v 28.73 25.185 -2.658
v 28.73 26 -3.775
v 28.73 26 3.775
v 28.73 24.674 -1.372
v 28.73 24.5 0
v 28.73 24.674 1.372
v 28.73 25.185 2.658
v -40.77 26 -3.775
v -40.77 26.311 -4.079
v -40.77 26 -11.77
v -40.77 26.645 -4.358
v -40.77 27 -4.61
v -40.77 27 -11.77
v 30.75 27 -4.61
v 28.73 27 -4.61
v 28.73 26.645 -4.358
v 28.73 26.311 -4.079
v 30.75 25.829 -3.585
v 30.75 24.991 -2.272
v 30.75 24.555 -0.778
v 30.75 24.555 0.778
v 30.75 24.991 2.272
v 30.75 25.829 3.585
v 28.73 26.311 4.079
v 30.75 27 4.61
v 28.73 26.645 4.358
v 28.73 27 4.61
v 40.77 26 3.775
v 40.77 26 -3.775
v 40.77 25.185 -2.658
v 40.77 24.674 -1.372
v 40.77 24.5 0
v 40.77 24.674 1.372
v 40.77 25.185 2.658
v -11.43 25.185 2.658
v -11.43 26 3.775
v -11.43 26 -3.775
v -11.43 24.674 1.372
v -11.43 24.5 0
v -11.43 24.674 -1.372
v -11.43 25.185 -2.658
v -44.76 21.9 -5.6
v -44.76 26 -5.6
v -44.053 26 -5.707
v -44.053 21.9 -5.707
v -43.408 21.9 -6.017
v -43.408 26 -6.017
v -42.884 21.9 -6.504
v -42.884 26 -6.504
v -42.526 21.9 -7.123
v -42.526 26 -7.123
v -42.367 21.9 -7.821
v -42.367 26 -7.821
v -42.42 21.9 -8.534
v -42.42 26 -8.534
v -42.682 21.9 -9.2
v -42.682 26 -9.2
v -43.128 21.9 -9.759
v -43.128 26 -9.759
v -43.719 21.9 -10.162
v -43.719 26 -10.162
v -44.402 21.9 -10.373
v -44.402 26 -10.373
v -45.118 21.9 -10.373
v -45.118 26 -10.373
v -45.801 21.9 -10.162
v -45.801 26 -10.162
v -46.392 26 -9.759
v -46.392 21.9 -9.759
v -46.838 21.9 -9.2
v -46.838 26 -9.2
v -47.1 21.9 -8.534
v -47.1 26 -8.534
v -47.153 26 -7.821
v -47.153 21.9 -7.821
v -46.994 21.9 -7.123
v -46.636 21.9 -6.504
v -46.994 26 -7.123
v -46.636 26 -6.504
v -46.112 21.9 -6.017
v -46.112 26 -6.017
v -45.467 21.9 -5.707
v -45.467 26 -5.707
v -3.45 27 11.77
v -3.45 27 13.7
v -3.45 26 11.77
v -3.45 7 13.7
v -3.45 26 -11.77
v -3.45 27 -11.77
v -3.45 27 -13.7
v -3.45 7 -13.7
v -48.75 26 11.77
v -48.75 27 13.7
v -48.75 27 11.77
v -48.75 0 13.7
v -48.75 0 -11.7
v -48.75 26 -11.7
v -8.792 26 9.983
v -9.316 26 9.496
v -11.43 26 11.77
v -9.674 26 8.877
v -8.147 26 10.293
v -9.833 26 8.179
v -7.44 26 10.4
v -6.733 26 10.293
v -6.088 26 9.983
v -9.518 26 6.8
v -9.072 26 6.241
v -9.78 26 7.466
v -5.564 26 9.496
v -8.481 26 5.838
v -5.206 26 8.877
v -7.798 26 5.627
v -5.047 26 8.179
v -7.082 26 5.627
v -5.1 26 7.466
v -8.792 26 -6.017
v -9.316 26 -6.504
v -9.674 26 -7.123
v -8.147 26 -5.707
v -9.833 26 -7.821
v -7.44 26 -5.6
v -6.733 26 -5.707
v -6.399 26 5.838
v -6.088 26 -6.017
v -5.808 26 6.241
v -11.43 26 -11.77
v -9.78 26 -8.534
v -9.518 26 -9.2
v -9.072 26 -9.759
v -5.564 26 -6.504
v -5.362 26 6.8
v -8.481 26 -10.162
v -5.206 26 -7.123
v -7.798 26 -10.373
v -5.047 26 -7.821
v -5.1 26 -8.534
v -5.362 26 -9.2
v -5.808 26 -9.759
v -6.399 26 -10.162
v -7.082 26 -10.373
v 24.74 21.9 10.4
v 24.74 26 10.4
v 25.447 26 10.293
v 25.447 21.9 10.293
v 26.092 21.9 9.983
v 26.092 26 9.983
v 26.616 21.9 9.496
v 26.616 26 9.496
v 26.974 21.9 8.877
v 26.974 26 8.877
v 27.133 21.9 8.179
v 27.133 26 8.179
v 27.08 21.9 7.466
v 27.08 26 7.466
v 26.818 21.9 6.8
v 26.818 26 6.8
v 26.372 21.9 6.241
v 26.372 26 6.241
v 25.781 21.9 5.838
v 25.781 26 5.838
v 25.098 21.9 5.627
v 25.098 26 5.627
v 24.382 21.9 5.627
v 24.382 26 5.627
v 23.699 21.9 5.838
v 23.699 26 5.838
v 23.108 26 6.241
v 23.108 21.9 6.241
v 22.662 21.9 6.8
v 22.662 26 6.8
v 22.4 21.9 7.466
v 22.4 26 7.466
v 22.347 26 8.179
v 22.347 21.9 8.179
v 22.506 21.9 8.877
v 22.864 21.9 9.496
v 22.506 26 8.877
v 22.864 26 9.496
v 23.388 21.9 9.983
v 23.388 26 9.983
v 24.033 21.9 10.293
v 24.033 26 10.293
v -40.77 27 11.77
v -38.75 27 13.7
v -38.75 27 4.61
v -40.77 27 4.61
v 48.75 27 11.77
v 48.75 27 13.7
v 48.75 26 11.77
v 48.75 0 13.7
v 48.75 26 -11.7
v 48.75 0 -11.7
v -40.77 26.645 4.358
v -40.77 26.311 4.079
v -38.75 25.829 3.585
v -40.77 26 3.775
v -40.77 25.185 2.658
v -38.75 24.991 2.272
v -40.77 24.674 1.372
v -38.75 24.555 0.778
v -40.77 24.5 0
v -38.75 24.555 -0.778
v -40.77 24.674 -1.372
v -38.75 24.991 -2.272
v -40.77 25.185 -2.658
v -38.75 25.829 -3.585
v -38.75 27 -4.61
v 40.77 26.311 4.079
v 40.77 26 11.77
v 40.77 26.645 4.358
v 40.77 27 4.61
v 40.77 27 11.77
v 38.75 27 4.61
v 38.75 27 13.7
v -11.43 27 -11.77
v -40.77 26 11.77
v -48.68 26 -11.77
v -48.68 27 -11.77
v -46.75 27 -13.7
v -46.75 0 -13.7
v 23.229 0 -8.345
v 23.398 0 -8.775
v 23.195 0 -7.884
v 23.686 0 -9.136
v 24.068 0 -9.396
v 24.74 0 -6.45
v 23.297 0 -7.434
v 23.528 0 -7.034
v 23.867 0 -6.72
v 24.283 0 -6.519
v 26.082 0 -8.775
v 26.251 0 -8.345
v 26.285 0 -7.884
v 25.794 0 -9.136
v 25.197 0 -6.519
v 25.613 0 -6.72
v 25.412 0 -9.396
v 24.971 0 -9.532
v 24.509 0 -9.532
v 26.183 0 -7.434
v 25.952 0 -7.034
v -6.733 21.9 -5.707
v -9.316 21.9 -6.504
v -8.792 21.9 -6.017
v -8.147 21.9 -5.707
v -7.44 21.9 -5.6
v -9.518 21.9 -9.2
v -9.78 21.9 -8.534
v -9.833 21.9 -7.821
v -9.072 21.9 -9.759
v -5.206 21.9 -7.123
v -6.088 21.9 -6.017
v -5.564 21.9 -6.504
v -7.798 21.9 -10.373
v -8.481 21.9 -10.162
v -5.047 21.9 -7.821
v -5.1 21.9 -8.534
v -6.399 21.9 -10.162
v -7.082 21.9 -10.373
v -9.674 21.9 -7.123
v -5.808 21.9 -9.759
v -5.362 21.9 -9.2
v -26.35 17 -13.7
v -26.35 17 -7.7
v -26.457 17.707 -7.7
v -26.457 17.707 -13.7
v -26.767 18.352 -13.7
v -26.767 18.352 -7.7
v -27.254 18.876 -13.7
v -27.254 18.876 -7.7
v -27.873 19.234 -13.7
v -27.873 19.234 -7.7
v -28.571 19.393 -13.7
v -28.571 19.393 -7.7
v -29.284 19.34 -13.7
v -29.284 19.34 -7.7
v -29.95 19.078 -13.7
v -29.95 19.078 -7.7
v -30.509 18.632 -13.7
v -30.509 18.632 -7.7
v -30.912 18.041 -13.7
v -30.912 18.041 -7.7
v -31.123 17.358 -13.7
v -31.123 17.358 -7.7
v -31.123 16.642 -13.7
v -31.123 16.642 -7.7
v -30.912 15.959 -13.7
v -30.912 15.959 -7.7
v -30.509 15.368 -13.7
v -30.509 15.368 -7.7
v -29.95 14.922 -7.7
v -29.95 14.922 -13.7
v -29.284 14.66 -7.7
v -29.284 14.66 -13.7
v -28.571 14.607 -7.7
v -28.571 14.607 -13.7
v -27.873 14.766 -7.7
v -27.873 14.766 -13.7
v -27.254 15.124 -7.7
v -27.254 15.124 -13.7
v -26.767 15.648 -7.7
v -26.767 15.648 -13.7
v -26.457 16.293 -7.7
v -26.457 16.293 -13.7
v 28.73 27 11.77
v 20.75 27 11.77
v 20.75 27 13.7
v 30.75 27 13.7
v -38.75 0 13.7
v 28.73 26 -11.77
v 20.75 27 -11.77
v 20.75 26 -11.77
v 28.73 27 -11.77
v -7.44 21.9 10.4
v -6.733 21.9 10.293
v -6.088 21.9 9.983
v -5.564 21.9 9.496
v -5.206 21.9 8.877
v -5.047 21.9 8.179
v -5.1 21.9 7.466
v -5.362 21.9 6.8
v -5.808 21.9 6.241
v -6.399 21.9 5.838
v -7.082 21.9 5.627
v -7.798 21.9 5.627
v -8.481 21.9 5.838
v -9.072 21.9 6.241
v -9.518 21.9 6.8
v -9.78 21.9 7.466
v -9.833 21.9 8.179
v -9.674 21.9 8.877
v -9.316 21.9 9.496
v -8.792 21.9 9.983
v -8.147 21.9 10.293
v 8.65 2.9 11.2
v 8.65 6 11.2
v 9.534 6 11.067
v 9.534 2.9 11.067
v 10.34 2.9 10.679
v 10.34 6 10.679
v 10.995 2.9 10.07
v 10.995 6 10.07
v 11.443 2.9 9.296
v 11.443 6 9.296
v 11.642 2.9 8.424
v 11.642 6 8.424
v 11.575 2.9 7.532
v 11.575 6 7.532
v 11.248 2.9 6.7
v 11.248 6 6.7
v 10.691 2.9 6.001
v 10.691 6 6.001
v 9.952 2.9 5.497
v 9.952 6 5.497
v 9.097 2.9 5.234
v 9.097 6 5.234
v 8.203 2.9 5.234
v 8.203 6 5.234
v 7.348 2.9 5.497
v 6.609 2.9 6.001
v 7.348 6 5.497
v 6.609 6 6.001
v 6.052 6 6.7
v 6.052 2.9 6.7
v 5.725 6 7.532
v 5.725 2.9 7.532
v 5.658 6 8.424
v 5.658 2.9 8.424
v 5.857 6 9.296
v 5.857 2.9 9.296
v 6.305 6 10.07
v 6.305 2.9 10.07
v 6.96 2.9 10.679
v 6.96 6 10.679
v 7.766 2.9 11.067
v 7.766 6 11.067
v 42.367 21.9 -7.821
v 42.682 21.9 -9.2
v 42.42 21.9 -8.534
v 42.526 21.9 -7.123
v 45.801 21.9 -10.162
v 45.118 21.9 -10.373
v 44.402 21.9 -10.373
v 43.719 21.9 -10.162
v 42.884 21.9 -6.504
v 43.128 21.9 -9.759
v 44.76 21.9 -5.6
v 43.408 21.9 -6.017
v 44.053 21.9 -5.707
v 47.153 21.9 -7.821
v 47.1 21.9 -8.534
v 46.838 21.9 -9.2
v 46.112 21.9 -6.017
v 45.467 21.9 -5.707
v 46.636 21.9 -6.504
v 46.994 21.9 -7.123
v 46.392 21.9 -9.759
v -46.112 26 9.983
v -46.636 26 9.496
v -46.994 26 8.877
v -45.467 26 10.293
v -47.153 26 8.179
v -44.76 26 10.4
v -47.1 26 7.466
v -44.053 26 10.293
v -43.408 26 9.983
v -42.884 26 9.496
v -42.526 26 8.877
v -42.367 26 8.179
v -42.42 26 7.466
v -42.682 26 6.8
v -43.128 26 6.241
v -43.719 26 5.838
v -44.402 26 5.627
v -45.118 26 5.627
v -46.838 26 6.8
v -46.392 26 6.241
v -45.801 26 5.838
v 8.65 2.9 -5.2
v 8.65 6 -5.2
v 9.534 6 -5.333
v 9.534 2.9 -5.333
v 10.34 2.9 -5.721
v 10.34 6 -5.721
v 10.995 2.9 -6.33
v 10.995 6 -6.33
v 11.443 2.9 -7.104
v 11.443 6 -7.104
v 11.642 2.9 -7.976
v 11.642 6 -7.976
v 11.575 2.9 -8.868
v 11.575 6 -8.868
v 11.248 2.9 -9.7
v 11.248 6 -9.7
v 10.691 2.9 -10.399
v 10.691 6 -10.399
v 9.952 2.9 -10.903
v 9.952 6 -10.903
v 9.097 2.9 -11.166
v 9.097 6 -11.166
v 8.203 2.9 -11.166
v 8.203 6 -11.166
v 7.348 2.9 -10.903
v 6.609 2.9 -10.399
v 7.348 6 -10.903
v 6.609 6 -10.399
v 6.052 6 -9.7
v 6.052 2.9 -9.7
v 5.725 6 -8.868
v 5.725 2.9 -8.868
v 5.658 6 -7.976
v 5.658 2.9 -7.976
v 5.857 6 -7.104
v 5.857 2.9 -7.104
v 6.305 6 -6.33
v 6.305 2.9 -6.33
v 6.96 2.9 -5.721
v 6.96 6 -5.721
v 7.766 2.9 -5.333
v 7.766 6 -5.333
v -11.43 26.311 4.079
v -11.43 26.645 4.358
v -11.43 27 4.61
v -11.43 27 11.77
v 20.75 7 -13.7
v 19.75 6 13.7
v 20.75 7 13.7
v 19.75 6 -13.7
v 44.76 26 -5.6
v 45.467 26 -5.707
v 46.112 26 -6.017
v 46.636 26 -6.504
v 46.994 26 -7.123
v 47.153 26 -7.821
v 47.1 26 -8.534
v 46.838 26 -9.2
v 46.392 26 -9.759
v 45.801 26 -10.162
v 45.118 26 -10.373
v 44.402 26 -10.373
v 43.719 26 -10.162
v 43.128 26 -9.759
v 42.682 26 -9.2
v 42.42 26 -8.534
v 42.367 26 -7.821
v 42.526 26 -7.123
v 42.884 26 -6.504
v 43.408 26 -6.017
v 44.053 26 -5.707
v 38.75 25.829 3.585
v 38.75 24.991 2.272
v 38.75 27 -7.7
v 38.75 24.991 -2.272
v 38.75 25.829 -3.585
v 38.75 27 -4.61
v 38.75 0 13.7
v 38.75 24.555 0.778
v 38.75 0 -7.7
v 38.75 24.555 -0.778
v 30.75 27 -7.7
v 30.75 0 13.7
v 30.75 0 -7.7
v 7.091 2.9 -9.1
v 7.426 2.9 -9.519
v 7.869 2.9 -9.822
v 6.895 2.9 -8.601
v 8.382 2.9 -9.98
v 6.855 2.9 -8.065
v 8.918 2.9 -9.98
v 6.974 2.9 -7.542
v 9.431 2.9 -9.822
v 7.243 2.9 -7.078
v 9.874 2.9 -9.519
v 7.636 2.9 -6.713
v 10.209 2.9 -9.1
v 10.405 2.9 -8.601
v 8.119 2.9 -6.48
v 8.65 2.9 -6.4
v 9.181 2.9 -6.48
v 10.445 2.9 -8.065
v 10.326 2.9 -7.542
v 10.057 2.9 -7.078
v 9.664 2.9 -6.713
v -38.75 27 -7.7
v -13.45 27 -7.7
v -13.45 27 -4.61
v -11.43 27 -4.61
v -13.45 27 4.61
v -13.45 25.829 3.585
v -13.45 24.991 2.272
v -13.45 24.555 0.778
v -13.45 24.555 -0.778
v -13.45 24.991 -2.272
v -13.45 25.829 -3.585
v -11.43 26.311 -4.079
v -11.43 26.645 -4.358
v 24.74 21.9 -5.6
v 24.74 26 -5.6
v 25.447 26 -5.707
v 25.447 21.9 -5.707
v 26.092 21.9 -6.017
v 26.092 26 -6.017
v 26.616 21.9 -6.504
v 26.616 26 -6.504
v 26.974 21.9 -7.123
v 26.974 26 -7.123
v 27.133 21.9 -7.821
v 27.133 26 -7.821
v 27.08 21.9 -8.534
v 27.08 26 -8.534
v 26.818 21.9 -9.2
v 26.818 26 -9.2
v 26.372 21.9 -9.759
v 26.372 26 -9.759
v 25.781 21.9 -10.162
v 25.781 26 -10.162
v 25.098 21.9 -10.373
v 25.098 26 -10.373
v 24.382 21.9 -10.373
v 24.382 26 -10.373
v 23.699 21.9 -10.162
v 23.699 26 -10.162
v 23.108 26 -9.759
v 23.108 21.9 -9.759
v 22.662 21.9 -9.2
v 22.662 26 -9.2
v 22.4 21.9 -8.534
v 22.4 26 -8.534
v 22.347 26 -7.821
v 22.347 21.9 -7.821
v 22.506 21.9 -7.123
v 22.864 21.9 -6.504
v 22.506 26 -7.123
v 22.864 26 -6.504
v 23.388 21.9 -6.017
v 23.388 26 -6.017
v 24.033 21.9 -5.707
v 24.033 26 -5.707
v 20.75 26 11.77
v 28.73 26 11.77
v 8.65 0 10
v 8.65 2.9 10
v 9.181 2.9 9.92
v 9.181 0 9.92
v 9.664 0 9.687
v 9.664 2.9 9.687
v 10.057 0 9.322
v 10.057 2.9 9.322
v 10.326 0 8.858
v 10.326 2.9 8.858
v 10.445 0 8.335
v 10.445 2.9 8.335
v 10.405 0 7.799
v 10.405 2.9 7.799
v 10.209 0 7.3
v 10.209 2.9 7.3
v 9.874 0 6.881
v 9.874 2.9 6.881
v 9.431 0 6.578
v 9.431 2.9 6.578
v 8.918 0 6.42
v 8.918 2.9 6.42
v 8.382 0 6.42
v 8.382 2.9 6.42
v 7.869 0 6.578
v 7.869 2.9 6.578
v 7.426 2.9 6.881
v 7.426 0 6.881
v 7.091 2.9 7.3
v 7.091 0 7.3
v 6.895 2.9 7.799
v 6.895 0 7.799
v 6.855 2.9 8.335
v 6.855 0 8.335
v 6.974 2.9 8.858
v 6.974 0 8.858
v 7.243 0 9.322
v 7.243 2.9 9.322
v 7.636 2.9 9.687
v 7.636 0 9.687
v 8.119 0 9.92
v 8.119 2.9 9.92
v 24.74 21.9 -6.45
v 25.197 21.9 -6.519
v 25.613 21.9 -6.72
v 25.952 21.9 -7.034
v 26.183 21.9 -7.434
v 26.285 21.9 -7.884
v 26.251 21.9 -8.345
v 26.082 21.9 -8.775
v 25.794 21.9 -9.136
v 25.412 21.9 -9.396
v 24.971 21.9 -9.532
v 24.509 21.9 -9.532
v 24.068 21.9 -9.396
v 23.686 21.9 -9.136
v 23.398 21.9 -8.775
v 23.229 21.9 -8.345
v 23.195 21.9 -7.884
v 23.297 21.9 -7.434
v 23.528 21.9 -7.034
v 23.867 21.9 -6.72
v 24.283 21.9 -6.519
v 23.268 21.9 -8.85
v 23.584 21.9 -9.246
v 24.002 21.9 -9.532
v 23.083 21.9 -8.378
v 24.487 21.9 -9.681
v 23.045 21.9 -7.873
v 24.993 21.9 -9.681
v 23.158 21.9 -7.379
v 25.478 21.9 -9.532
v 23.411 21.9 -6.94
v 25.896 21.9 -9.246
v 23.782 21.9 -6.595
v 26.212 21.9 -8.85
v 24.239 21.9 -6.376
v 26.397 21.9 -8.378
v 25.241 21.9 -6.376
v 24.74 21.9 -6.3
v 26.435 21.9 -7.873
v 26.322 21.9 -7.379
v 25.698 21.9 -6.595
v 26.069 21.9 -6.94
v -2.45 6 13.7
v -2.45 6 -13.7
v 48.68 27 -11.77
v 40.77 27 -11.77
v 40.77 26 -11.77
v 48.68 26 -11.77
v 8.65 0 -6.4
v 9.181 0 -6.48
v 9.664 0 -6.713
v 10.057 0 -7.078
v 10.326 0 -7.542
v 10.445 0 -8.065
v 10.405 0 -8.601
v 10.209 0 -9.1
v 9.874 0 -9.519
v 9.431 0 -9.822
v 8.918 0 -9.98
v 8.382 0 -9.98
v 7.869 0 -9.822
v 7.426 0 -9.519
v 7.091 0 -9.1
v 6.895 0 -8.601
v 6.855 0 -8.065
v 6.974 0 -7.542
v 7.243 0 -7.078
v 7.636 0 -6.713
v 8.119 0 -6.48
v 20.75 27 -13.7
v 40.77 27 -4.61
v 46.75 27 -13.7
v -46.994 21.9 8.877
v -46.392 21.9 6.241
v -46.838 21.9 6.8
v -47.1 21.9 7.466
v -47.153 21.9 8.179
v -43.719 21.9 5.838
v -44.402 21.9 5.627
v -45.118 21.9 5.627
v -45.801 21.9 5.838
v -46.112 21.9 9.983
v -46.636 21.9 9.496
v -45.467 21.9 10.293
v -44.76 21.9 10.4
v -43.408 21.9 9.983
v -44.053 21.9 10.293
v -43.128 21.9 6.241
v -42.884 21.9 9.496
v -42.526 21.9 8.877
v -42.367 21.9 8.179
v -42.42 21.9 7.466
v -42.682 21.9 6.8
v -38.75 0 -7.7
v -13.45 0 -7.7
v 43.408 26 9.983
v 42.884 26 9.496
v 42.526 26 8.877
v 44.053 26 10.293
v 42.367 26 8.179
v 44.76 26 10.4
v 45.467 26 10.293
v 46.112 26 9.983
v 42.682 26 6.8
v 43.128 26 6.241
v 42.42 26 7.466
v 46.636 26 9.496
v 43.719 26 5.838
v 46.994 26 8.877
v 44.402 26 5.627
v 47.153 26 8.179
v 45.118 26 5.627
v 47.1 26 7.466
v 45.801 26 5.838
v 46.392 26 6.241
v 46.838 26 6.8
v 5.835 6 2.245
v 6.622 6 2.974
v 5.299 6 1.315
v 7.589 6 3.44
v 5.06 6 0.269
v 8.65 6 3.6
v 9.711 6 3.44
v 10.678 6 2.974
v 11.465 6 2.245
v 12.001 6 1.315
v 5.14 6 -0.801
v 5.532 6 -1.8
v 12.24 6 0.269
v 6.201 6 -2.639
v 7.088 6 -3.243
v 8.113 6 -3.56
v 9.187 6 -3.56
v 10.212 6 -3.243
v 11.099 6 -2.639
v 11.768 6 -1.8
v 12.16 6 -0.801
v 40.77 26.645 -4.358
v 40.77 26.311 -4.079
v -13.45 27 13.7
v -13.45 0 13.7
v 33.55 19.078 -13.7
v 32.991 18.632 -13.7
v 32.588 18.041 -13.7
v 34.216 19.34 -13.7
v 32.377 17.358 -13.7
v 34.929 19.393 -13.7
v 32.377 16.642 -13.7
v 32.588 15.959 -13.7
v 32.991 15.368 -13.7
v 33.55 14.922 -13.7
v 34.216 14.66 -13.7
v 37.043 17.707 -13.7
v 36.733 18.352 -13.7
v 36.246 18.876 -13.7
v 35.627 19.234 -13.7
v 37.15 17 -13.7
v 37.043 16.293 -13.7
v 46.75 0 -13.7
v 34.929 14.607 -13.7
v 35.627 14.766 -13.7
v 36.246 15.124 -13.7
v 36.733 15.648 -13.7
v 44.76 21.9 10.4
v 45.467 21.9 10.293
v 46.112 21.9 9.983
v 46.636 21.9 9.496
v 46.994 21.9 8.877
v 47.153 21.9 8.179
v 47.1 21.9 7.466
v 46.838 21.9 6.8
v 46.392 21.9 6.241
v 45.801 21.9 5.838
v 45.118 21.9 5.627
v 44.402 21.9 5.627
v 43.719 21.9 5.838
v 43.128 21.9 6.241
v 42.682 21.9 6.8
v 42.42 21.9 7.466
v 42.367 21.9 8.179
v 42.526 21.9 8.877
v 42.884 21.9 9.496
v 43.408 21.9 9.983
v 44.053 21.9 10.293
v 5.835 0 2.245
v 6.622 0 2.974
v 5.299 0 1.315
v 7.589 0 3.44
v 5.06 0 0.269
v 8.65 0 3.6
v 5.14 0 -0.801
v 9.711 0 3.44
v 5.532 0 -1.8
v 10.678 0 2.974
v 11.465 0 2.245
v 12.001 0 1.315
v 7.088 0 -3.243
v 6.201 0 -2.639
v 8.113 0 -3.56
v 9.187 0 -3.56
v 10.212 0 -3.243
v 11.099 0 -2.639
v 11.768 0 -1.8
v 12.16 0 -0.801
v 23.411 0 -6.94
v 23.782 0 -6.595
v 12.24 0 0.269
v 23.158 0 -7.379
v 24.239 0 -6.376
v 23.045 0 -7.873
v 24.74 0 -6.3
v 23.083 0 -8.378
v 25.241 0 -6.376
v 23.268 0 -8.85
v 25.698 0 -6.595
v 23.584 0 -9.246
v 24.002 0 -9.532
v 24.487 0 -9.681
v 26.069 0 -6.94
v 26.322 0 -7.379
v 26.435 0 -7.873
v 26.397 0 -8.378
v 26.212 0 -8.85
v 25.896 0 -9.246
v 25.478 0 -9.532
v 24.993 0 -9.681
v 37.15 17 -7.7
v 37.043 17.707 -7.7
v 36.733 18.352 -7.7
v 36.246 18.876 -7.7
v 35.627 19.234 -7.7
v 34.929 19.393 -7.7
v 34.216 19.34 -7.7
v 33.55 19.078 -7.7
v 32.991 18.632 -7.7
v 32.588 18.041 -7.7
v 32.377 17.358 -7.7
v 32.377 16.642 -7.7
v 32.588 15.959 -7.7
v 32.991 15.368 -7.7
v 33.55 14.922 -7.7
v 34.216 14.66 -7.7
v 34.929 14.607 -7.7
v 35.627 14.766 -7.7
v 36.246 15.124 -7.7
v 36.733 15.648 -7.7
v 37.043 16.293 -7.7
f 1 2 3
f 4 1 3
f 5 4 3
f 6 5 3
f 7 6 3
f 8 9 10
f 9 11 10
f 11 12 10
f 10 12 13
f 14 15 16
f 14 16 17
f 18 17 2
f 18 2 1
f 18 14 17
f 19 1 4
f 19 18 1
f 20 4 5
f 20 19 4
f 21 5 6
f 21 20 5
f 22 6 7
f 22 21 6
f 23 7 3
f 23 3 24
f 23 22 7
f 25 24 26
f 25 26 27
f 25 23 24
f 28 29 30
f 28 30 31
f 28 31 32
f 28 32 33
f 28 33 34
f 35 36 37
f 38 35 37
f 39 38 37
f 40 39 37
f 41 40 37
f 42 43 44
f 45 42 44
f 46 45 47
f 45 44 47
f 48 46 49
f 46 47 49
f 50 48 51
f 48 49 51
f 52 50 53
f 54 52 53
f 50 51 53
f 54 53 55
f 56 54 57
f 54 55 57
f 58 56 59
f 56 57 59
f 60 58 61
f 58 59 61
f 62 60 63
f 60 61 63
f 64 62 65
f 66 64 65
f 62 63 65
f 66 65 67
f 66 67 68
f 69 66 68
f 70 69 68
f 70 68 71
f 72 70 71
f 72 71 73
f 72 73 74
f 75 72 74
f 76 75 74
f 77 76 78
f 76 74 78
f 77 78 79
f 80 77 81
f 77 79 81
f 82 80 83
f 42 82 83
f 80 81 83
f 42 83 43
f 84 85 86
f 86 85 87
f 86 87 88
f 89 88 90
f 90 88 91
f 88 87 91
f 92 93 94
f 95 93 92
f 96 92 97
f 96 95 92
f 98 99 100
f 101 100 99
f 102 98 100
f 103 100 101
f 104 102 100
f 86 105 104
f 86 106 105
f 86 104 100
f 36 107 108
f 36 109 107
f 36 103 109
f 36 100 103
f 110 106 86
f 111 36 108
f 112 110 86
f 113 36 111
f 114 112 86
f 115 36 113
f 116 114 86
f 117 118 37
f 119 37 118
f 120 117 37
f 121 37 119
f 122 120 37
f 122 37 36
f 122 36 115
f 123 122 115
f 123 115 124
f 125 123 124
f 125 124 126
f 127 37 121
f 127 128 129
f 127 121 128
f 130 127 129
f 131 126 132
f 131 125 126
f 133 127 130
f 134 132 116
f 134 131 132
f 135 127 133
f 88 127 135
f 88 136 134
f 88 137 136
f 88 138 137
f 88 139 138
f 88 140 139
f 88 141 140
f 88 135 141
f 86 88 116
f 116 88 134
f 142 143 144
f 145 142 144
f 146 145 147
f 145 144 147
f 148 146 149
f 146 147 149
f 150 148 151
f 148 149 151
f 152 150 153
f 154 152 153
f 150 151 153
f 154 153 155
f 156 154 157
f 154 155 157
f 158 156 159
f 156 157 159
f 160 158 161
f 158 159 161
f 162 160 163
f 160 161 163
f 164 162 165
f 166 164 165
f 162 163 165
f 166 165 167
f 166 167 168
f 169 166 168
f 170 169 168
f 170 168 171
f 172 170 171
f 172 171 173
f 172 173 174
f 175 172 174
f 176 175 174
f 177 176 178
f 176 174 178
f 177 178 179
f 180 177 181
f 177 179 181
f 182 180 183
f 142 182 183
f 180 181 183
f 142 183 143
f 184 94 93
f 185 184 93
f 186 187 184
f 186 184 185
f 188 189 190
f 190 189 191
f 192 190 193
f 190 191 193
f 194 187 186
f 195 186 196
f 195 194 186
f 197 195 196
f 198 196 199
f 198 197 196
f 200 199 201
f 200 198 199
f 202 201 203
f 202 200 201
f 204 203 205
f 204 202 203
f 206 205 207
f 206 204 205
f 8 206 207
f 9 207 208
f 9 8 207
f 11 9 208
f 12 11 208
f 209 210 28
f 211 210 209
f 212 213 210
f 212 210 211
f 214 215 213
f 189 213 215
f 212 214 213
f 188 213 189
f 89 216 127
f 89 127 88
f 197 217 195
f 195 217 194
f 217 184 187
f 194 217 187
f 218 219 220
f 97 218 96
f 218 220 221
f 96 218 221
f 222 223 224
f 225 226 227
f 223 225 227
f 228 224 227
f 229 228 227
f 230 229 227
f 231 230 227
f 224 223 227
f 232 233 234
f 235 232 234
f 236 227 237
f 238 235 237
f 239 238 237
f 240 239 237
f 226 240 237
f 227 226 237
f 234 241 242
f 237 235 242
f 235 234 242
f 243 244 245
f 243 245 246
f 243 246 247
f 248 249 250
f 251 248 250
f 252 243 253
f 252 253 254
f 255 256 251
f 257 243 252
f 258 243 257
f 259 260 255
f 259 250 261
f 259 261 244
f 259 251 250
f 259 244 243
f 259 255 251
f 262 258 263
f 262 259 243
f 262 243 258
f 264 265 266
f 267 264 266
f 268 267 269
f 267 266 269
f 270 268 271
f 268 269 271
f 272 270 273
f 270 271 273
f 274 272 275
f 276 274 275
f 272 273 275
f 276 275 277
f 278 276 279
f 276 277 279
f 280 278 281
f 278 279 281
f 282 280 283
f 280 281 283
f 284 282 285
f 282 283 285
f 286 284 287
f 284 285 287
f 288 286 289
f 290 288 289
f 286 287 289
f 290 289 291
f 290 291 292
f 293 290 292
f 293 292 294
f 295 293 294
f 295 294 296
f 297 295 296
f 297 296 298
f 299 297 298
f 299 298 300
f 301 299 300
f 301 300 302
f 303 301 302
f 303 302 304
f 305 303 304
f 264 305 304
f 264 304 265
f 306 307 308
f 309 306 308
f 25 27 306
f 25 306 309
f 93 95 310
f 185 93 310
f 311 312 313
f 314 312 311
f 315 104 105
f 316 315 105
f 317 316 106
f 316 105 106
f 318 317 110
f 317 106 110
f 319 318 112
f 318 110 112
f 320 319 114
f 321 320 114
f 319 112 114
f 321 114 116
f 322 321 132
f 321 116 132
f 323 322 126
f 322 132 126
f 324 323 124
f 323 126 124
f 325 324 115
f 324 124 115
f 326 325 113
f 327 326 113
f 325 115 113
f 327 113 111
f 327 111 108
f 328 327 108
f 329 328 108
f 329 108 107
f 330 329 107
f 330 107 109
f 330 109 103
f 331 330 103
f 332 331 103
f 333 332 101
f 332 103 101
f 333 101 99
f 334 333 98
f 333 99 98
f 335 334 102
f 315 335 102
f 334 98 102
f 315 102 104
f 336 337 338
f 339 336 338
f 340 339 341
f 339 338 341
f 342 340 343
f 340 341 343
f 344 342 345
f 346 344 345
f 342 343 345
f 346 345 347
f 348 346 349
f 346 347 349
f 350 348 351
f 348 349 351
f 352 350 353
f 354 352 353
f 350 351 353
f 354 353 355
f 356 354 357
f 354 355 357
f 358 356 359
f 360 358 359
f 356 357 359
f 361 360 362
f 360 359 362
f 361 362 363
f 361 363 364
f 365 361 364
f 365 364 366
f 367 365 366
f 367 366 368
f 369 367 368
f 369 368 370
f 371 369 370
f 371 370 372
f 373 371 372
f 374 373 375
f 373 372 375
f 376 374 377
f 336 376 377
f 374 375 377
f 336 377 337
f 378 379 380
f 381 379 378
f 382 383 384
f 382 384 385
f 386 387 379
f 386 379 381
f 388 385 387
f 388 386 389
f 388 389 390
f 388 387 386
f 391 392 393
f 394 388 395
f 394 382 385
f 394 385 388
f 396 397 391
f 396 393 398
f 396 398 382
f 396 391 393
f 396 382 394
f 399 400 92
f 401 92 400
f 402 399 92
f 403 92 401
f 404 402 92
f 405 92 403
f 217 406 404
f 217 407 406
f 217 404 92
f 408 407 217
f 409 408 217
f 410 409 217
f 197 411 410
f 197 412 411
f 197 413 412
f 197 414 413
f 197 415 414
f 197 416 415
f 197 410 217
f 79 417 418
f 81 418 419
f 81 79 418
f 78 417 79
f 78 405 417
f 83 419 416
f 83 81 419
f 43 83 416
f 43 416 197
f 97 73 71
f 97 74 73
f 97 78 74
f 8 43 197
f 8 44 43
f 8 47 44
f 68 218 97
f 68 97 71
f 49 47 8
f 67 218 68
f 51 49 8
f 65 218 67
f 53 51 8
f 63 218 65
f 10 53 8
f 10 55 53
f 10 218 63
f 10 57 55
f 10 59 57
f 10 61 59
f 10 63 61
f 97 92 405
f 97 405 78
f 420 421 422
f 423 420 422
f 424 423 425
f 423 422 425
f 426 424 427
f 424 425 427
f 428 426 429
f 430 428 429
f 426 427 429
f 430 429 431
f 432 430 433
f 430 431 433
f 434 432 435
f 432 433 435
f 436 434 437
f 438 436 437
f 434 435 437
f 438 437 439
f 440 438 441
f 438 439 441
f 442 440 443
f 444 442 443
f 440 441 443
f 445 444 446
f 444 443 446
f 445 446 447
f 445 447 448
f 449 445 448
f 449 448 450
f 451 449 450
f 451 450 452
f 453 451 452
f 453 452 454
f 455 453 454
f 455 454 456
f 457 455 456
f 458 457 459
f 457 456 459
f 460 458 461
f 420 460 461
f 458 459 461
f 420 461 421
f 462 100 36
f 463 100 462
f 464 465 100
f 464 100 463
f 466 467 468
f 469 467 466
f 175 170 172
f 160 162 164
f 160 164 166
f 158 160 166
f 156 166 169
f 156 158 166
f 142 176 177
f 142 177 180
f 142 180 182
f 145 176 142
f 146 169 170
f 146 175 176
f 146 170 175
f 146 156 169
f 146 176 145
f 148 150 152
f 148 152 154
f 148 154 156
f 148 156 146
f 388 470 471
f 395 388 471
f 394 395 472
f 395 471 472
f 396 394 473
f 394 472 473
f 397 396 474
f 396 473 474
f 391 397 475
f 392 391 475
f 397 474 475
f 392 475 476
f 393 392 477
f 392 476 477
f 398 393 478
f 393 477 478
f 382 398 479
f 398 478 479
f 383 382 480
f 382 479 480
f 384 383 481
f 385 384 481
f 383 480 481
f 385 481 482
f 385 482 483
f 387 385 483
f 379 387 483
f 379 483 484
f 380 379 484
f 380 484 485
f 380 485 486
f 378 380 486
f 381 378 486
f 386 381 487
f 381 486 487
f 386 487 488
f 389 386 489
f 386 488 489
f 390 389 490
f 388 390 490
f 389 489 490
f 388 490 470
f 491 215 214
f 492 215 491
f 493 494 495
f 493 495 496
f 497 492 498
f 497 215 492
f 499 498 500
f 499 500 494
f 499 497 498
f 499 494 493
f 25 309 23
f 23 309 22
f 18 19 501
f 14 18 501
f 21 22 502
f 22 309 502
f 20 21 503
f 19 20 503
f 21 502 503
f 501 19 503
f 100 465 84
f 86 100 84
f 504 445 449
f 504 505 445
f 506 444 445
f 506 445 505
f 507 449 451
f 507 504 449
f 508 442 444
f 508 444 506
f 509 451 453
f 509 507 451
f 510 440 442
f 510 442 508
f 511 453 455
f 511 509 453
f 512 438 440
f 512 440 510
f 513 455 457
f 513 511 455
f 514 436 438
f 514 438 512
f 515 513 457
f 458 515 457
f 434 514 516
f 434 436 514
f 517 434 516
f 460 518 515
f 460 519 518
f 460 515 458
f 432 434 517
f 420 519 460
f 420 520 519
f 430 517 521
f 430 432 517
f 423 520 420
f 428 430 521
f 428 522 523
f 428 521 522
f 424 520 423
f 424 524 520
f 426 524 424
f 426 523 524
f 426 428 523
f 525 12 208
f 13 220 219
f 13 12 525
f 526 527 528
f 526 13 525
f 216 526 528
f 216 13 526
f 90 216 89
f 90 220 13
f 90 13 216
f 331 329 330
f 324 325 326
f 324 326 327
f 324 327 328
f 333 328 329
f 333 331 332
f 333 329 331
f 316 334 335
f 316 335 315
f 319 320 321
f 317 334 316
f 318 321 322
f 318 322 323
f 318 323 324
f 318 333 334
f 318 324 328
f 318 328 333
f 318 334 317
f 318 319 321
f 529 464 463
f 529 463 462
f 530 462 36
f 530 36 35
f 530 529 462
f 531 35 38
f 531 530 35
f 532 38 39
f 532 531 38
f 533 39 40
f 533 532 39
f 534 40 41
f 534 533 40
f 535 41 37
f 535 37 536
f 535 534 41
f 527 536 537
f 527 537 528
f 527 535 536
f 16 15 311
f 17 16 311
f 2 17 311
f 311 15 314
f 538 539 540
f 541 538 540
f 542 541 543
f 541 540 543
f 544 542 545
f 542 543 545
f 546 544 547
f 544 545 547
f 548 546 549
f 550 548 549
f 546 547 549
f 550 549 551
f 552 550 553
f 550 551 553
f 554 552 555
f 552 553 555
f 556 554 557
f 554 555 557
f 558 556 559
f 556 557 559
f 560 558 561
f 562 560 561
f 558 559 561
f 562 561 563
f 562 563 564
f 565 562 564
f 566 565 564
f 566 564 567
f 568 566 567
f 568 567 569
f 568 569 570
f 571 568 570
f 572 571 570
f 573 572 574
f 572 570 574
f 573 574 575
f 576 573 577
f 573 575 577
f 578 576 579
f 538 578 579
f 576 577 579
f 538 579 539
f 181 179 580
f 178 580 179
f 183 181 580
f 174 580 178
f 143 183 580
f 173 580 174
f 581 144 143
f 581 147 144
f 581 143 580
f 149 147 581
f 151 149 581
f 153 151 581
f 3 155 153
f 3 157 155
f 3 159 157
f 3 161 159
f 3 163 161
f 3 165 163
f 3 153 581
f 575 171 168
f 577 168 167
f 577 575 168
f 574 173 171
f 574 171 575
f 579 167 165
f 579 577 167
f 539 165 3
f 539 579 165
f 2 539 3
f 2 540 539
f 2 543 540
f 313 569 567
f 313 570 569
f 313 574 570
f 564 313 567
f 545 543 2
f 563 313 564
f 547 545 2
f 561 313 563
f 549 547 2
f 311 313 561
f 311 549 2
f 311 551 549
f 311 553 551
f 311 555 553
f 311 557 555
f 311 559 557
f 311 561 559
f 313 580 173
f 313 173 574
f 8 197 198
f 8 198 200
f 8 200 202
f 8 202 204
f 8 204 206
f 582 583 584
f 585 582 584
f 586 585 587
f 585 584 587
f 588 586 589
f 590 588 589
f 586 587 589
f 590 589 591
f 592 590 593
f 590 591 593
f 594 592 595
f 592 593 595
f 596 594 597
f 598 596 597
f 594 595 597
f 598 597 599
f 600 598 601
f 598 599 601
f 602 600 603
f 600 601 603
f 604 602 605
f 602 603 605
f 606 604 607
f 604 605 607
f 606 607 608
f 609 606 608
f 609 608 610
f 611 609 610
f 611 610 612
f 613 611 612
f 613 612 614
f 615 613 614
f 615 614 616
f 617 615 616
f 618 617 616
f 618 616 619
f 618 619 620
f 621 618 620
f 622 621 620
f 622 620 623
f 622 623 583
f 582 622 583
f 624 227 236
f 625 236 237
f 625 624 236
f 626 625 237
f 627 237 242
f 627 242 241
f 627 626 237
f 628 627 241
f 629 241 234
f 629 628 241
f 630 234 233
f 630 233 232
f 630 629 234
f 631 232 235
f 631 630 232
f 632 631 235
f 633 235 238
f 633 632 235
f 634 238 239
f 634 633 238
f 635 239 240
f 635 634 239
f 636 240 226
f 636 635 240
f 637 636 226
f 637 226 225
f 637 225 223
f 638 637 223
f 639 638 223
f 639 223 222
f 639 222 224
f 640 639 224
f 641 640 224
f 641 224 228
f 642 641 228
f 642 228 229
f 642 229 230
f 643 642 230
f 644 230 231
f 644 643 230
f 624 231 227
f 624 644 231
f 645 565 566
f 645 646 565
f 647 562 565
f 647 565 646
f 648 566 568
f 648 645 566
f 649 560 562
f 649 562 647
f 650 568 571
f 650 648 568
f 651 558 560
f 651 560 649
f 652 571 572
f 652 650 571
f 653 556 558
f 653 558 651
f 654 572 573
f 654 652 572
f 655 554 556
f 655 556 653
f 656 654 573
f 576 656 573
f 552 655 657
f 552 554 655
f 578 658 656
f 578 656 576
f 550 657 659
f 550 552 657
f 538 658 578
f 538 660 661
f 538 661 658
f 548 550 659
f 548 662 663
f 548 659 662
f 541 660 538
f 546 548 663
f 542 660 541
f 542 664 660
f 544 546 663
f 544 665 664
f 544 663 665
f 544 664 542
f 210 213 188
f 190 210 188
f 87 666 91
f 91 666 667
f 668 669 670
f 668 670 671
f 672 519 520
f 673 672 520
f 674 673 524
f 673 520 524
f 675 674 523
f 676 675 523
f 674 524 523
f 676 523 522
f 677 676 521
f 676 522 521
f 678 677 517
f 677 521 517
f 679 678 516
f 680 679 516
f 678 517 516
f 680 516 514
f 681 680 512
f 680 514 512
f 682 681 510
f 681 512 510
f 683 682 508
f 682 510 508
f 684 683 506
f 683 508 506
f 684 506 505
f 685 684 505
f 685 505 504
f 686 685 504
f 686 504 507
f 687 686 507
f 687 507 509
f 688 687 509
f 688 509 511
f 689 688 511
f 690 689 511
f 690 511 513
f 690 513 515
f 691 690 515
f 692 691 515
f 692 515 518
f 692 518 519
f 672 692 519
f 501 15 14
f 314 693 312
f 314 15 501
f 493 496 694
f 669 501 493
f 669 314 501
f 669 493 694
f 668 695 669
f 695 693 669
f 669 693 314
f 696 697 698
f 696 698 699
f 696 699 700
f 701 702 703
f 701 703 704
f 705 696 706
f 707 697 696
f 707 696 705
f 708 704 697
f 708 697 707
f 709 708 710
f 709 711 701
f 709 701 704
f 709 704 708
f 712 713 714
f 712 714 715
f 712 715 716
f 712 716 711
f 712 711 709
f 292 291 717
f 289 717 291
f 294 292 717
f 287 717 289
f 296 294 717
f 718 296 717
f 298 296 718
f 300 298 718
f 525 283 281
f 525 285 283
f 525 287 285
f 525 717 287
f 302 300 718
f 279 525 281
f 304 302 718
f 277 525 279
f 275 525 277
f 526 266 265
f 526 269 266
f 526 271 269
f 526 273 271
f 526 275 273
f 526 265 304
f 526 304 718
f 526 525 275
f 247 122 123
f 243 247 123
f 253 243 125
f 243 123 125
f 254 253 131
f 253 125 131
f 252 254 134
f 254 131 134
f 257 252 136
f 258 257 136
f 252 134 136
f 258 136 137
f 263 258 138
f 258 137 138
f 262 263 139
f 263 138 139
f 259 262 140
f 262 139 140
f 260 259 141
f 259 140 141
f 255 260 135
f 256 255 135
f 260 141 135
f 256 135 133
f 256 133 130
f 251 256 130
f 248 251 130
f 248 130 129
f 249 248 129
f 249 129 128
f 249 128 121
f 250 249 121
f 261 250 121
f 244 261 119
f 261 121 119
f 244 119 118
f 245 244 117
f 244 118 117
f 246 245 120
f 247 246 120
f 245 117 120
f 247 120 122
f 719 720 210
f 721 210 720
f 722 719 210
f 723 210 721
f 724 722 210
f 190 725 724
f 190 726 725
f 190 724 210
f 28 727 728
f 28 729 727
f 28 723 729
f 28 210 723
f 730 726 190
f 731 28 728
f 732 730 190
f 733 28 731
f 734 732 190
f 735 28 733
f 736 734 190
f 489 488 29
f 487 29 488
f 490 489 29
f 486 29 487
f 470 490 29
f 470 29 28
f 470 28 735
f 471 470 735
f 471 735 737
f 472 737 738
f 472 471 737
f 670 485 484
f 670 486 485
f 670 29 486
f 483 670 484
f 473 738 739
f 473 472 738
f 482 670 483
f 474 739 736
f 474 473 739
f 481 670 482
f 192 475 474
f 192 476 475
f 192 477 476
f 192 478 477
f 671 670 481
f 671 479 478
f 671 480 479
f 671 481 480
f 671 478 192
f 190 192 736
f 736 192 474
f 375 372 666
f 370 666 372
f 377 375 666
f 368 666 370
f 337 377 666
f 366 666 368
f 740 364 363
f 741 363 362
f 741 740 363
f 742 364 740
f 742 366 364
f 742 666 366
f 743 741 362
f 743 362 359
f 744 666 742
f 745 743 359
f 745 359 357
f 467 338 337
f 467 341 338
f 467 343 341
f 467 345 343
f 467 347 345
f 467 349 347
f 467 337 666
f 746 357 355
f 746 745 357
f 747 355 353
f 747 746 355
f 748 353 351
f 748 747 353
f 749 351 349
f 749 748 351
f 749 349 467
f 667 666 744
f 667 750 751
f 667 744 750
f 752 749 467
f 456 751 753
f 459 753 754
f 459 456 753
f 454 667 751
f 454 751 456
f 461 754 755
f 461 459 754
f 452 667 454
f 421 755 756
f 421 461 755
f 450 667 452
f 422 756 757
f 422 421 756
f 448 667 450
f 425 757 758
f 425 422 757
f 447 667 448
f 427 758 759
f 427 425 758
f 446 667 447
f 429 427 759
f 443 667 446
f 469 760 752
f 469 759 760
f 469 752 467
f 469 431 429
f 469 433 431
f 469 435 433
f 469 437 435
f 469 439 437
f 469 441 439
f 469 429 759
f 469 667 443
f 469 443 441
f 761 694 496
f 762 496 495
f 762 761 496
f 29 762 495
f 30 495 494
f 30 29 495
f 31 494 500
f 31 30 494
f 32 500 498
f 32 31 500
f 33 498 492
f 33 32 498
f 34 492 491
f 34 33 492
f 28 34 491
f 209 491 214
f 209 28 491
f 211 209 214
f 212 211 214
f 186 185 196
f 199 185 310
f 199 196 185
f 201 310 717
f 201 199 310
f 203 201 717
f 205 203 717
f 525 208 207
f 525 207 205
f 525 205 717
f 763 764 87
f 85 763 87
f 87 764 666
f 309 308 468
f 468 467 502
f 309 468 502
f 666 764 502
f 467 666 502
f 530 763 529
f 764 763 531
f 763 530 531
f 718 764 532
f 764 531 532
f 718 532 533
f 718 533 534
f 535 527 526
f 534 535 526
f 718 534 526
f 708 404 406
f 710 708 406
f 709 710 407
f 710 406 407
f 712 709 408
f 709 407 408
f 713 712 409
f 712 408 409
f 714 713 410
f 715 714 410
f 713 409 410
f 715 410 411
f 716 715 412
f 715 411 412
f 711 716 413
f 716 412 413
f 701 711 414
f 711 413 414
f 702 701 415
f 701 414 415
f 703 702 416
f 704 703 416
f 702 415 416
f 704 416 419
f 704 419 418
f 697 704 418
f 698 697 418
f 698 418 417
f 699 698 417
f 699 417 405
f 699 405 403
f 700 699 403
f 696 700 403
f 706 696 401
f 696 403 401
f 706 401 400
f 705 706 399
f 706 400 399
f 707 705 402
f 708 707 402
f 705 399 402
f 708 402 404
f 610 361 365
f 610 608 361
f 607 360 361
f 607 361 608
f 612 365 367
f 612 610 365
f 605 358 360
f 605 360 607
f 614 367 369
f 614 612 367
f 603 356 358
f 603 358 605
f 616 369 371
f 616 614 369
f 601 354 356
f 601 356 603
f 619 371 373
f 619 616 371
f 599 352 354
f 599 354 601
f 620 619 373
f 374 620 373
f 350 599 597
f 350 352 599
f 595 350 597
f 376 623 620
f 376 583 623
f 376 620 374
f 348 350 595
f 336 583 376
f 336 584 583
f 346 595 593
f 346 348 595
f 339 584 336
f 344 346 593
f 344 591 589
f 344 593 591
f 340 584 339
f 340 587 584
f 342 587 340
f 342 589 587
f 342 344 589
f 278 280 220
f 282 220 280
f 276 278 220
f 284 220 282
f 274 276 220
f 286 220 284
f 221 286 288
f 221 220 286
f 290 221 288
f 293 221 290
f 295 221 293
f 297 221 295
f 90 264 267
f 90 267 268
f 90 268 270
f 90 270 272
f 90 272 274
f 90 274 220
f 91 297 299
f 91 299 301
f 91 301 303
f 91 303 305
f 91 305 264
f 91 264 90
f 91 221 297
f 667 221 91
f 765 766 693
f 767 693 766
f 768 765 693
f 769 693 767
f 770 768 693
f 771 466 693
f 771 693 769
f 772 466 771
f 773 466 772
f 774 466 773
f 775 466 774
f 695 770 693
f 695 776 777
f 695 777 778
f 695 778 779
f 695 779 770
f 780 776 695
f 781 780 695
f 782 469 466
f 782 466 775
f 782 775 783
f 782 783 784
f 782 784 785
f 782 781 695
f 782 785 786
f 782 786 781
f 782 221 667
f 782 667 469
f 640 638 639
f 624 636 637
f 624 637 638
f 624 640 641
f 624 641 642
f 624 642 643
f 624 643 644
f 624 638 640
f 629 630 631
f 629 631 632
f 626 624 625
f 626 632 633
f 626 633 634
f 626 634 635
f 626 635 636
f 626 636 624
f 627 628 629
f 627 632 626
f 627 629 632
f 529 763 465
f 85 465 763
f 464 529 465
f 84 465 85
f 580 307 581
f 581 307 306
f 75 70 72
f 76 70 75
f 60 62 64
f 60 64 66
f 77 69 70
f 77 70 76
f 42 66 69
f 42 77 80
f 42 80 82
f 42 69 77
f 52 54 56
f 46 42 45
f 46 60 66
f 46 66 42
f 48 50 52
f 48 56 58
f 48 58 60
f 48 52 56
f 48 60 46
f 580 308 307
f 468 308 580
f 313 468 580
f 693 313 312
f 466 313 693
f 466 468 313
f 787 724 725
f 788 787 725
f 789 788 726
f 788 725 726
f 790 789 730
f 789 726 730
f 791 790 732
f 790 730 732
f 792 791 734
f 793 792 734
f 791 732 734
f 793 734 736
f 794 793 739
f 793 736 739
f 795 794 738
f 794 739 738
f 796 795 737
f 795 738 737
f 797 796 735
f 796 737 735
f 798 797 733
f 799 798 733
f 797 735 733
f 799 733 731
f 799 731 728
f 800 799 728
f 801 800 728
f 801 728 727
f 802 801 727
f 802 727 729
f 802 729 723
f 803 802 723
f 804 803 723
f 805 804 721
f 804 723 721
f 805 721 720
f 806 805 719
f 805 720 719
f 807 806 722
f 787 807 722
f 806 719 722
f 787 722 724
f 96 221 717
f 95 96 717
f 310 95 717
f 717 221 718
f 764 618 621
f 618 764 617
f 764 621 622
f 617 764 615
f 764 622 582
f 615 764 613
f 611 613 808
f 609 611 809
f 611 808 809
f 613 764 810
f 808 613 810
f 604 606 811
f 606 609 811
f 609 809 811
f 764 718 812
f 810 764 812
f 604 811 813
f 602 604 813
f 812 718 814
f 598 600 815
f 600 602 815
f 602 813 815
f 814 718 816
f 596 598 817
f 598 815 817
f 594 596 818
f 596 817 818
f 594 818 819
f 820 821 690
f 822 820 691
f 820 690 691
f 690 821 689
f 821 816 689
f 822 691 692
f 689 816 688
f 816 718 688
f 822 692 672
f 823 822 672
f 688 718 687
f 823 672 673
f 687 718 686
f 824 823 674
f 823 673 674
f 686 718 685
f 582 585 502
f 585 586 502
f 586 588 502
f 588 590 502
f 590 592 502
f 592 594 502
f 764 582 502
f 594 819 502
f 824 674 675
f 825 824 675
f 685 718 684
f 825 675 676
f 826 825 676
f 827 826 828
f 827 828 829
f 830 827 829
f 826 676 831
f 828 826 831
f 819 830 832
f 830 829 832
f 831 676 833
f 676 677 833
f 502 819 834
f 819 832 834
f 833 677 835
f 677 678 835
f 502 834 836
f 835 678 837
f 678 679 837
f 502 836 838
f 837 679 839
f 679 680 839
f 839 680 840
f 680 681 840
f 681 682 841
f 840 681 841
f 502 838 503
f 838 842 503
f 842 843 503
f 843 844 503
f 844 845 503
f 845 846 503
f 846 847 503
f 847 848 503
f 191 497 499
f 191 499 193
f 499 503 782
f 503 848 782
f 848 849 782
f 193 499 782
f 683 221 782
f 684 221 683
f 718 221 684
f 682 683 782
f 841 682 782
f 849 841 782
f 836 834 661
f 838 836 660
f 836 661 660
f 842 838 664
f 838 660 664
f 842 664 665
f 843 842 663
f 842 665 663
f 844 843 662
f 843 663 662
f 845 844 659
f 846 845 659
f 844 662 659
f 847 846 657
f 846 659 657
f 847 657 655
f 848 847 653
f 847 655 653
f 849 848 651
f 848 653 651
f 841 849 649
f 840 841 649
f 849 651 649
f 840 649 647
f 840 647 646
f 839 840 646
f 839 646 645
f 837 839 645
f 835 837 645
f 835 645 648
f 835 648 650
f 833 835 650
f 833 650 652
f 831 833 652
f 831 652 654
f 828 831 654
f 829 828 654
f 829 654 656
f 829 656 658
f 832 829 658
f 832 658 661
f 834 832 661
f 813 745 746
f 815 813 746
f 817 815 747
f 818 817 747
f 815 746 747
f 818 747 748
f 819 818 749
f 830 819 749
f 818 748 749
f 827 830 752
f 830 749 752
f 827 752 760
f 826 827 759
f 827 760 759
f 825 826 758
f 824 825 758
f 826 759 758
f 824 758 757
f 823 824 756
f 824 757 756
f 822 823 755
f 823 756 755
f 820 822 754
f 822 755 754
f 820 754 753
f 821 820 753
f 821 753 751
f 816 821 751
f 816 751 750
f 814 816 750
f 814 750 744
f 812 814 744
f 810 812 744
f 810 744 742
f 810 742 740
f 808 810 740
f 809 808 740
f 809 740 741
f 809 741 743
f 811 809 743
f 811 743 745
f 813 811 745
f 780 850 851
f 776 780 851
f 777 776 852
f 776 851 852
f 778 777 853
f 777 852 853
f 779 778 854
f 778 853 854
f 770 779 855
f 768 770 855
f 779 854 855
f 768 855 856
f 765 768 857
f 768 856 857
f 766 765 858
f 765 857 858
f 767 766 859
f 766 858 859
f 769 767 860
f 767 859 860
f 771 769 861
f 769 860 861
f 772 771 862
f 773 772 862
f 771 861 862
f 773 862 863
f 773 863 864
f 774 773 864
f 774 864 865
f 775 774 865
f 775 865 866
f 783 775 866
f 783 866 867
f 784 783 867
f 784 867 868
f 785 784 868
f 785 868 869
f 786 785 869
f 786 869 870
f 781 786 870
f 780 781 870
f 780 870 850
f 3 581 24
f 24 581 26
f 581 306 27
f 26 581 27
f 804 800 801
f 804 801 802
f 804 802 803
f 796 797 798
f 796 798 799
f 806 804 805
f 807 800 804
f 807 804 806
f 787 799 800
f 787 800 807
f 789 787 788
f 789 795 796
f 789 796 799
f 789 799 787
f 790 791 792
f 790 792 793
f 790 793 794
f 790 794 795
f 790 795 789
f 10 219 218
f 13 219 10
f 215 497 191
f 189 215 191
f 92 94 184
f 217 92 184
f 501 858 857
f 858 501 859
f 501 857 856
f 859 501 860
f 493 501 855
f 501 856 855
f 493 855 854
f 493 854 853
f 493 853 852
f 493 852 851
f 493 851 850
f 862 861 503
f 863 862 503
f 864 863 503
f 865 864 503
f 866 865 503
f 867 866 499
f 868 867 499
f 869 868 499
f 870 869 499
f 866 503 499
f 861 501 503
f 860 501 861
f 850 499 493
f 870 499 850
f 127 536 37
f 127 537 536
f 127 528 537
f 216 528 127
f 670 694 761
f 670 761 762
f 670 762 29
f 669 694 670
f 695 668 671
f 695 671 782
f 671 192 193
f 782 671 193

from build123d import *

# Parameters (mm, degrees)
SKETCH_2_W                = 97.5
SKETCH_2_H                = 27.4
EXTRUDE_1_DEPTH           = 6
SKETCH_3_W                = 10
SKETCH_3_H                = 27.4
EXTRUDE_2_DEPTH           = 21
SKETCH_5_W                = 7.98
SKETCH_5_H                = 23.54
CUT_EXTRUDE_1_DEPTH       = 1
SKETCH_7_R                = 1.7
CUT_EXTRUDE_2_DEPTH       = 57.923215826
SKETCH_8_R                = 3.6
SKETCH_8_R_2              = 1.8
CUT_EXTRUDE_3_DEPTH       = 55.820183327
CHAMFER_1_SIZE            = 2
SKETCH_13_W               = 8
SKETCH_13_H               = 6
SKETCH_13_W_2             = 25.3
EXTRUDE_3_DEPTH           = 21
SKETCH_14_R               = 2.4
CUT_EXTRUDE_9_DEPTH       = 10
SKETCH_15_W               = 25.3
SKETCH_15_H               = 21.4
SKETCH_15_W_2             = 8
CUT_EXTRUDE_10_DEPTH      = 10
SKETCH_16_R               = 3
CUT_EXTRUDE_11_DEPTH      = 3.1
SKETCH_17_R               = 2.4
CUT_EXTRUDE_12_DEPTH      = 4.1
CUT_EXTRUDE_13_DEPTH      = 10.02
CUT_EXTRUDE_13_DEPTH_BACK = 2.02
SKETCH_18_R               = 5.5
CUT_EXTRUDE_15_DEPTH      = 27.32
CUT_EXTRUDE_15_DEPTH_BACK = 2.02
SKETCH_20_R               = 5.5
CHAMFER_2_SIZE            = 1
SKETCH_21_R               = 1.7
SKETCH_21_R_2             = 1.549701769
EXTRUDE_4_DEPTH           = 21.9


with BuildPart() as part:
    # ｽｹｯﾁ2 → ﾎﾞｽ - 押し出し1 (new body)
    with BuildSketch(Plane(origin=(0, 0, 0), x_dir=(1, 0, 0), z_dir=(0, 1, 0))):
        Rectangle(SKETCH_2_W, SKETCH_2_H)
    extrude(amount=EXTRUDE_1_DEPTH)

    # ｽｹｯﾁ3 → ﾎﾞｽ - 押し出し2 (add)
    with BuildSketch(Plane(origin=(0, 6, 0), x_dir=(1, 0, 0), z_dir=(0, 1, 0))):
        with Locations((-43.75, 0)):
            Rectangle(SKETCH_3_W, SKETCH_3_H)
        with Locations((43.75, 0)):
            Rectangle(SKETCH_3_W, SKETCH_3_H)
        with Locations((-8.45, 0)):
            Rectangle(SKETCH_3_W, SKETCH_3_H)
        with Locations((25.75, 0)):
            Rectangle(SKETCH_3_W, SKETCH_3_H)
    extrude(amount=EXTRUDE_2_DEPTH)

    # ｽｹｯﾁ5 → ｶｯﾄ - 押し出し1 (cut)
    with BuildSketch(Plane(origin=(0, 27, 0), x_dir=(1, 0, 0), z_dir=(0, 1, 0))):
        with Locations((-44.76, 0)):
            Rectangle(SKETCH_5_W, SKETCH_5_H)
        with Locations((-7.44, 0)):
            Rectangle(SKETCH_5_W, SKETCH_5_H)
        with Locations((24.74, 0)):
            Rectangle(SKETCH_5_W, SKETCH_5_H)
        with Locations((44.76, 0)):
            Rectangle(SKETCH_5_W, SKETCH_5_H)
    extrude(amount=-CUT_EXTRUDE_1_DEPTH, mode=Mode.SUBTRACT)

    # ｽｹｯﾁ7 → ｶｯﾄ - 押し出し2 (cut, through all)
    with BuildSketch(Plane(origin=(0, 26, 0), x_dir=(1, 0, 0), z_dir=(0, 1, 0))):
        with Locations(Location((-44.76, 8, 0), (0, 0, 270))):
            Circle(SKETCH_7_R)
        with Locations(Location((-44.76, -8, 0), (0, 0, 270))):
            Circle(SKETCH_7_R)
        with Locations(Location((-7.44, 8, 0), (0, 0, 270))):
            Circle(SKETCH_7_R)
        with Locations(Location((-7.44, -8, 0), (0, 0, 270))):
            Circle(SKETCH_7_R)
        with Locations(Location((24.74, 8, 0), (0, 0, 270))):
            Circle(SKETCH_7_R)
        with Locations(Location((24.74, -8, 0), (0, 0, 270))):
            Circle(SKETCH_7_R)
        with Locations(Location((44.76, 8, 0), (0, 0, 270))):
            Circle(SKETCH_7_R)
        with Locations(Location((44.76, -8, 0), (0, 0, 270))):
            Circle(SKETCH_7_R)
    extrude(amount=-CUT_EXTRUDE_2_DEPTH, mode=Mode.SUBTRACT)

    # ｽｹｯﾁ8 → ｶｯﾄ - 押し出し3 (cut, through all)
    with BuildSketch(Plane(origin=(0, 6, 0), x_dir=(1, 0, 0), z_dir=(0, 1, 0))):
        with Locations(Location((8.65, 0, 0), (0, 0, 270))):
            Circle(SKETCH_8_R)
        with Locations(Location((8.65, 8.2, 0), (0, 0, 270))):
            Circle(SKETCH_8_R_2)
        with Locations(Location((8.65, -8.2, 0), (0, 0, 270))):
            Circle(SKETCH_8_R_2)
    extrude(amount=-CUT_EXTRUDE_3_DEPTH, mode=Mode.SUBTRACT)

    # 面取り1
    chamfer_1_edges = [part.edges().sort_by_distance(p)[0] for p in [
        (48.75, 13.5, -13.7),
        (-48.75, 13.5, -13.7),
    ]]
    chamfer(chamfer_1_edges, length=CHAMFER_1_SIZE)

    # ｽｹｯﾁ13 → ﾎﾞｽ - 押し出し3 (add)
    with BuildSketch(Plane(origin=(0, 6, 0), x_dir=(1, 0, 0), z_dir=(0, 1, 0))):
        with Locations((34.75, 10.7)):
            Rectangle(SKETCH_13_W, SKETCH_13_H)
        with Locations((-26.1, 10.7)):
            Rectangle(SKETCH_13_W_2, SKETCH_13_H)
    extrude(amount=EXTRUDE_3_DEPTH)

    # ｽｹｯﾁ14 → ｶｯﾄ - 押し出し9 (cut)
    with BuildSketch(Plane.XY.offset(-7.7)):
        with Locations((-28.75, 17)):
            Circle(SKETCH_14_R)
        with Locations((34.75, 17)):
            Circle(SKETCH_14_R)
    extrude(amount=-CUT_EXTRUDE_9_DEPTH, mode=Mode.SUBTRACT)

    # ｽｹｯﾁ15 → ｶｯﾄ - 押し出し10 (cut)
    with BuildSketch(Plane(origin=(0, 6, 0), x_dir=(1, 0, 0), z_dir=(0, 1, 0))):
        with Locations((-26.1, -3)):
            Rectangle(SKETCH_15_W, SKETCH_15_H)
        with Locations((34.75, -3)):
            Rectangle(SKETCH_15_W_2, SKETCH_15_H)
    extrude(amount=-CUT_EXTRUDE_10_DEPTH, mode=Mode.SUBTRACT)

    # ｽｹｯﾁ16 → ｶｯﾄ - 押し出し11 (cut)
    with BuildSketch(Plane(origin=(0, 6, 0), x_dir=(1, 0, 0), z_dir=(0, 1, 0))):
        with Locations(Location((8.65, 8.2, 0), (0, 0, 270))):
            Circle(SKETCH_16_R)
        with Locations(Location((8.65, -8.2, 0), (0, 0, 270))):
            Circle(SKETCH_16_R)
    extrude(amount=-CUT_EXTRUDE_11_DEPTH, mode=Mode.SUBTRACT)

    # ｽｹｯﾁ17 → ｶｯﾄ - 押し出し12 (cut)
    with BuildSketch(Plane(origin=(0, 26, 0), x_dir=(1, 0, 0), z_dir=(0, 1, 0))):
        with Locations(Location((-44.76, 8, 0), (0, 0, 270))):
            Circle(SKETCH_17_R)
        with Locations(Location((-44.76, -8, 0), (0, 0, 270))):
            Circle(SKETCH_17_R)
        with Locations(Location((-7.44, 8, 0), (0, 0, 270))):
            Circle(SKETCH_17_R)
        with Locations(Location((-7.44, -8, 0), (0, 0, 270))):
            Circle(SKETCH_17_R)
        with Locations(Location((24.74, 8, 0), (0, 0, 270))):
            Circle(SKETCH_17_R)
        with Locations(Location((24.74, -8, 0), (0, 0, 270))):
            Circle(SKETCH_17_R)
        with Locations(Location((44.76, 8, 0), (0, 0, 270))):
            Circle(SKETCH_17_R)
        with Locations(Location((44.76, -8, 0), (0, 0, 270))):
            Circle(SKETCH_17_R)
    extrude(amount=-CUT_EXTRUDE_12_DEPTH, mode=Mode.SUBTRACT)

    # ｽｹｯﾁ18 → ｶｯﾄ - 押し出し13 (cut, two sides: drawn at the far end of the back side and taken through both)
    with BuildSketch(Plane.ZY.offset(-38.75).offset(-CUT_EXTRUDE_13_DEPTH_BACK)):
        with Locations((0, 30)):
            Circle(SKETCH_18_R)
    extrude(amount=CUT_EXTRUDE_13_DEPTH + CUT_EXTRUDE_13_DEPTH_BACK, mode=Mode.SUBTRACT)

    # ｽｹｯﾁ20 → ｶｯﾄ - 押し出し15 (cut, two sides: drawn at the far end of the back side and taken through both)
    with BuildSketch(Plane(origin=(-38.75, 0, 0), x_dir=(0, 0, -1), z_dir=(1, 0, 0)).offset(-CUT_EXTRUDE_15_DEPTH_BACK)):
        with Locations((0, 30)):
            Circle(SKETCH_20_R)
    extrude(amount=CUT_EXTRUDE_15_DEPTH + CUT_EXTRUDE_15_DEPTH_BACK, mode=Mode.SUBTRACT)

    # 面取り2
    chamfer_2_edges = [part.edges().sort_by_distance(p)[0] for p in [
        (20.75, 6, 0),
        (-3.45, 6, 0),
    ]]
    chamfer(chamfer_2_edges, length=CHAMFER_2_SIZE)

    # ｽｹｯﾁ21 → ﾎﾞｽ - 押し出し4 (add)
    with BuildSketch(Plane(origin=(0, 21.9, 0), x_dir=(1, 0, 0), z_dir=(0, 1, 0))):
        with Locations((-7.44, 8)):
            Circle(SKETCH_21_R)
        with Locations((-44.76, 8)):
            Circle(SKETCH_21_R)
        with Locations(Location((24.74, 8, 0), (0, 0, 270))):
            Circle(SKETCH_21_R_2)
        with Locations((-44.76, -8)):
            Circle(SKETCH_21_R)
        with Locations((-7.44, -8)):
            Circle(SKETCH_21_R)
        with Locations((24.74, -8)):
            Circle(SKETCH_21_R)
        with Locations((44.76, 8)):
            Circle(SKETCH_21_R)
        with Locations((44.76, -8)):
            Circle(SKETCH_21_R)
    extrude(amount=-EXTRUDE_4_DEPTH)


with BuildPart() as extrude_4_piece_1:
    # of the separate pieces the step leaves, piece 1, a body of its own (extrude_4_pieces)
    add(part.part.solids().sort_by_distance((-3.45, 7, -13.7))[0])


with BuildPart() as extrude_4_piece_2:
    # of the separate pieces the step leaves, piece 2, a body of its own (extrude_4_pieces)
    add(part.part.solids().sort_by_distance((24.74, 21.9, -6.450298231))[0])


solid = Compound([extrude_4_piece_1.part, extrude_4_piece_2.part])
